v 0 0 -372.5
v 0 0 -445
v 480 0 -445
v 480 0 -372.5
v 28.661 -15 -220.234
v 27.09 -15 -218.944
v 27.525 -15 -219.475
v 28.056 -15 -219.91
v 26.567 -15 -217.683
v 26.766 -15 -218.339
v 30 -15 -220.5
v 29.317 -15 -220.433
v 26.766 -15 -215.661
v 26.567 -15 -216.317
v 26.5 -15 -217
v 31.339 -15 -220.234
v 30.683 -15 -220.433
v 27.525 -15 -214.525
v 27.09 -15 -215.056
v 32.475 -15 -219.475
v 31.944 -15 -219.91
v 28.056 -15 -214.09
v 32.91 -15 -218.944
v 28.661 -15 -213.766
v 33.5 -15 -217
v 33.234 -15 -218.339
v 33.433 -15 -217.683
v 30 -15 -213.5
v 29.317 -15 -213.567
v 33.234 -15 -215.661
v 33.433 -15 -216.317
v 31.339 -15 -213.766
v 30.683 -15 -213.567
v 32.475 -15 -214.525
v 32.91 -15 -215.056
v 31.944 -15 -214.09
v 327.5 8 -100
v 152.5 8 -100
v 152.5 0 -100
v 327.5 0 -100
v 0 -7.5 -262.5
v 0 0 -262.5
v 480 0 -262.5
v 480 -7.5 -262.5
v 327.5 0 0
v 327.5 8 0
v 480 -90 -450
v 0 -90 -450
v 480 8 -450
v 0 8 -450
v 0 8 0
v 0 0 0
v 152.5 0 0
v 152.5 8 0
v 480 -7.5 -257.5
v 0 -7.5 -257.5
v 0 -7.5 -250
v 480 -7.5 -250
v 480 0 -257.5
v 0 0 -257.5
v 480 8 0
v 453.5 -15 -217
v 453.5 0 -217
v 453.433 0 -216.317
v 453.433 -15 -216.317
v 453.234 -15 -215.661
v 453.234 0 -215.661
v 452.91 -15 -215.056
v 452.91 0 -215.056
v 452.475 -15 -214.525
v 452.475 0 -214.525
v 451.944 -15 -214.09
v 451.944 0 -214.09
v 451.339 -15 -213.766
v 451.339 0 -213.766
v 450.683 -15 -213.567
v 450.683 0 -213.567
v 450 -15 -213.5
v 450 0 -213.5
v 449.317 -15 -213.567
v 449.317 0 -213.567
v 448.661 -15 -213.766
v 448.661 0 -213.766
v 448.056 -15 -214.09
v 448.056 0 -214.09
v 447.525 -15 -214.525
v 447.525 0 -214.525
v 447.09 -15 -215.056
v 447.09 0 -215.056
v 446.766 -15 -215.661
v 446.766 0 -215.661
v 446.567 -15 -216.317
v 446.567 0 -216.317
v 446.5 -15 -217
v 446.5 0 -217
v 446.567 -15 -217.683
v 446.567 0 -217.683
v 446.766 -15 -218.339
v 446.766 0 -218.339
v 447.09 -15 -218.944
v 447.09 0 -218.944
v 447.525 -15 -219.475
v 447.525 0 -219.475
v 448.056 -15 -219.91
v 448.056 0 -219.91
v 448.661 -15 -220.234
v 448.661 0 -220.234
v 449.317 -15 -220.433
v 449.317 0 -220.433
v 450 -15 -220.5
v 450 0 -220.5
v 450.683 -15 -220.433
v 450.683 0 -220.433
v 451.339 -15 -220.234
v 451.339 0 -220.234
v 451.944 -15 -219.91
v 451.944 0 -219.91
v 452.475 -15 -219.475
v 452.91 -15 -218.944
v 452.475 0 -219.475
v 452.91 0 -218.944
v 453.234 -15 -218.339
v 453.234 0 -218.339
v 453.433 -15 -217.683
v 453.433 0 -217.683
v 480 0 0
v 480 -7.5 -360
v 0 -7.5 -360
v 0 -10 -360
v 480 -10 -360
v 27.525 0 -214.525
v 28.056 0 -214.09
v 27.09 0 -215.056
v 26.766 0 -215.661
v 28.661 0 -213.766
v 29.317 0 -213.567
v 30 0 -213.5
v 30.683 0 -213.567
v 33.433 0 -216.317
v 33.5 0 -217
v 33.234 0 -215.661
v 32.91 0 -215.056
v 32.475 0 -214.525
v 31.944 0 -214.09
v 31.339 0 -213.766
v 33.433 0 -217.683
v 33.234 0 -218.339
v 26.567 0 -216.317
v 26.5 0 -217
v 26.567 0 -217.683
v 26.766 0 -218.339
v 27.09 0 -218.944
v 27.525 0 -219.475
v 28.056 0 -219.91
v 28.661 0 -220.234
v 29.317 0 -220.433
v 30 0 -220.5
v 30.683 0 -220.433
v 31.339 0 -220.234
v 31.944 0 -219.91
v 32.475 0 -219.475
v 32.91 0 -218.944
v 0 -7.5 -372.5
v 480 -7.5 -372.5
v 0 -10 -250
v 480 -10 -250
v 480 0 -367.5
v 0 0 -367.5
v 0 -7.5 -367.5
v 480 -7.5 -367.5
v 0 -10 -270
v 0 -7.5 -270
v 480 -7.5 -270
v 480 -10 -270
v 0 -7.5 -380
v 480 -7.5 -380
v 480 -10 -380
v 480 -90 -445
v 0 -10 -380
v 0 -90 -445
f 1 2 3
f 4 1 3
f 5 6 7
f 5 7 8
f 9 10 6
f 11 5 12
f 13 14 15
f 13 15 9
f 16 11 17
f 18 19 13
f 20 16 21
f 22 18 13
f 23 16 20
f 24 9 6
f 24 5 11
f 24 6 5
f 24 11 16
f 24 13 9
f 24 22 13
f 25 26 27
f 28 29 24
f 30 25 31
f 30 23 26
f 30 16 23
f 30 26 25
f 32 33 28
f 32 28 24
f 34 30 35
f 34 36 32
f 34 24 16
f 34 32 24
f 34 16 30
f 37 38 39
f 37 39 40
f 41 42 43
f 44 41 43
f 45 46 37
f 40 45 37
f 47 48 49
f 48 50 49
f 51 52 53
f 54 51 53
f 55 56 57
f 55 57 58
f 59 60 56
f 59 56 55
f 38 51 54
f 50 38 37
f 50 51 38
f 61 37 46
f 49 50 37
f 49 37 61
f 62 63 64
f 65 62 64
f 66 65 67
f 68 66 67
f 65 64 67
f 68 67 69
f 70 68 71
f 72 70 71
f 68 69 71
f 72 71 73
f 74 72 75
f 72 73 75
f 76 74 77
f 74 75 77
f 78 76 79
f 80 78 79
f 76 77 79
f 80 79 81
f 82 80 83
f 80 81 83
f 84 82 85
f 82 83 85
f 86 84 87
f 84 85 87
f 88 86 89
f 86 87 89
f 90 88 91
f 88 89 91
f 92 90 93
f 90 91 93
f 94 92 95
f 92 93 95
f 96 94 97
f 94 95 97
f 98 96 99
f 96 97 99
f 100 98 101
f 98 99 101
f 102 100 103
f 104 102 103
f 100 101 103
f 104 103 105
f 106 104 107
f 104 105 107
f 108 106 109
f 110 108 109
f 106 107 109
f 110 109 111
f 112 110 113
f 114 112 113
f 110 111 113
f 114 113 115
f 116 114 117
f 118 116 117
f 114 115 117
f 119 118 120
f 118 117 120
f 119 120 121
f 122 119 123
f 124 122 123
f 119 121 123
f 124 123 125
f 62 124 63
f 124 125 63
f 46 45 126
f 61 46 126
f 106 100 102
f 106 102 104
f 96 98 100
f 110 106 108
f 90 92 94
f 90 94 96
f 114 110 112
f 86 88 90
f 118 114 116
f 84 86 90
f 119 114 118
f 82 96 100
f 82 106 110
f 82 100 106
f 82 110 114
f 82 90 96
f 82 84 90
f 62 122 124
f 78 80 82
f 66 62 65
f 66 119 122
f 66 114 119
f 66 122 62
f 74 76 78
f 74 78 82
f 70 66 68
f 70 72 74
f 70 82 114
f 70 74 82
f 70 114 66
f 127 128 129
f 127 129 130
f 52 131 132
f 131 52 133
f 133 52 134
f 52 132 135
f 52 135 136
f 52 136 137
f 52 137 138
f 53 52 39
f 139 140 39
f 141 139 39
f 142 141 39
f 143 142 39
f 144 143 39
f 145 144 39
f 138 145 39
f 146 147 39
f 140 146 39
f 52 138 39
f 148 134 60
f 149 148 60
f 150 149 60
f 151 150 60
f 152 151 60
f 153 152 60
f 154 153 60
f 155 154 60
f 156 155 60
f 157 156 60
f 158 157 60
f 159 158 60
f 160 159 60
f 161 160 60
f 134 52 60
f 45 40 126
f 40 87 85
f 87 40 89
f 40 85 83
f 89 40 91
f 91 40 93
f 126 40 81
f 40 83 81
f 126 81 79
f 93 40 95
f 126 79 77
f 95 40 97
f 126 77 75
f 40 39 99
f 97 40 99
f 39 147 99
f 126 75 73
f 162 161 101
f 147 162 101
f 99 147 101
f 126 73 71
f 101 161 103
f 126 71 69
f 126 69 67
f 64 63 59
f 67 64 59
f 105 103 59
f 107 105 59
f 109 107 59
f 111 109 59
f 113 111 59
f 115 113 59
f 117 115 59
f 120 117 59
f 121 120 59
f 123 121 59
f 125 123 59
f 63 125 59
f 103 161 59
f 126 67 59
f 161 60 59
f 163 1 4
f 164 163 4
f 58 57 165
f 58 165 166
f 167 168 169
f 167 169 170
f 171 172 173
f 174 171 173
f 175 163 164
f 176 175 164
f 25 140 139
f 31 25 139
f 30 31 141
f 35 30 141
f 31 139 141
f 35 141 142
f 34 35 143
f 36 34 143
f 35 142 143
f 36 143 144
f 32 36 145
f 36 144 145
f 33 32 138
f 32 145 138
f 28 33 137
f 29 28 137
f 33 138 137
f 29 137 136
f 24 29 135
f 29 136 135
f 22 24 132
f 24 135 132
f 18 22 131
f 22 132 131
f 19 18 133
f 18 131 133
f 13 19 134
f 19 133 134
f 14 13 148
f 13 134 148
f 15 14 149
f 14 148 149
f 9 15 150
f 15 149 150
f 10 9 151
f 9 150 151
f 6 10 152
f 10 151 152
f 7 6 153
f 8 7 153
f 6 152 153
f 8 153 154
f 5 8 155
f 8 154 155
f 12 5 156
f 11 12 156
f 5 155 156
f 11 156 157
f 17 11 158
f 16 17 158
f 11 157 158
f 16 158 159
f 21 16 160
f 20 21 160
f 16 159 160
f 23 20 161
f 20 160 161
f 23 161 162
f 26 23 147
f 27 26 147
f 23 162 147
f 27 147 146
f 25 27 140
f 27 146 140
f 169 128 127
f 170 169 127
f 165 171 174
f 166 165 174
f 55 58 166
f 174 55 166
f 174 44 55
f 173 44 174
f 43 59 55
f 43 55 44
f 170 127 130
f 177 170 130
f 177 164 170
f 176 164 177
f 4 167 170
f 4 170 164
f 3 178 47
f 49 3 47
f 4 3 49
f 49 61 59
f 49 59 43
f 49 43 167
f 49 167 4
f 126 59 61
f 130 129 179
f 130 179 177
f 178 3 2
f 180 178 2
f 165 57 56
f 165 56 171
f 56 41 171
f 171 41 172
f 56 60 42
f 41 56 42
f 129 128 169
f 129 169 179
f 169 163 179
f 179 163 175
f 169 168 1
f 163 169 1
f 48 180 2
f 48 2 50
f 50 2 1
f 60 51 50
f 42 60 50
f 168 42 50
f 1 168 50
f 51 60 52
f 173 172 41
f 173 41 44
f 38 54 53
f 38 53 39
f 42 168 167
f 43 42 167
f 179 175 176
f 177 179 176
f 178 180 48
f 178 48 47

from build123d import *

# Parameters (mm, degrees)
SKETCH1_W           = 480
SKETCH1_H           = 450
BOSS_EXTRUDE1_DEPTH = 8
SKETCH2_W           = 175
SKETCH2_H           = 100
CUT_EXTRUDE1_DEPTH  = 10
SKETCH4_R           = 3.5
BOSS_EXTRUDE3_DEPTH = 15
BOSS_EXTRUDE4_DEPTH = 90
SKETCH9_W           = 480
SKETCH9_H           = 5
BOSS_EXTRUDE6_DEPTH = 7.5
SKETCH10_W          = 480
SKETCH10_H          = 20
BOSS_EXTRUDE7_DEPTH = 2.5


with BuildPart() as part:
    # Sketch1 → Boss-Extrude1 (new body)
    with BuildSketch(Plane(origin=(0, 0, 0), x_dir=(1, 0, 0), z_dir=(0, 1, 0))):
        with Locations((240, 225)):
            Rectangle(SKETCH1_W, SKETCH1_H)
    extrude(amount=BOSS_EXTRUDE1_DEPTH)

    # Sketch2 → Cut-Extrude1 (cut)
    with BuildSketch(Plane(origin=(0, 8, 0), x_dir=(1, 0, 0), z_dir=(0, 1, 0))):
        with Locations((240, 50)):
            Rectangle(SKETCH2_W, SKETCH2_H)
    extrude(amount=-CUT_EXTRUDE1_DEPTH, mode=Mode.SUBTRACT)

    # Sketch4 → Boss-Extrude3 (add)
    with BuildSketch(Plane.XZ):
        with Locations((30, -217)):
            Circle(SKETCH4_R)
        with Locations((450, -217)):
            Circle(SKETCH4_R)
    extrude(amount=BOSS_EXTRUDE3_DEPTH)

    # Sketch5 → Boss-Extrude4 (add)
    with BuildSketch(Plane.XZ):
        Polygon((5, -445), (0, -445), (0, -450), (480, -450), (480, -445), (475, -445), align=None)
    extrude(amount=BOSS_EXTRUDE4_DEPTH)

    # Sketch9 → Boss-Extrude6 (add)
    with BuildSketch(Plane.XZ):
        with Locations((240, -370)):
            Rectangle(SKETCH9_W, SKETCH9_H)
    boss_extrude6 = extrude(amount=BOSS_EXTRUDE6_DEPTH)

    # Sketch10 → Boss-Extrude7 (add)
    with BuildSketch(Plane.XZ.offset(7.5)):
        with Locations((240, -370)):
            Rectangle(SKETCH10_W, SKETCH10_H)
    boss_extrude7 = extrude(amount=BOSS_EXTRUDE7_DEPTH)

    # Mirror9: Boss-Extrude6, Boss-Extrude7 across plane
    add(boss_extrude6.mirror(Plane.XY.offset(-315)))
    add(boss_extrude7.mirror(Plane.XY.offset(-315)))


solid = part.part
